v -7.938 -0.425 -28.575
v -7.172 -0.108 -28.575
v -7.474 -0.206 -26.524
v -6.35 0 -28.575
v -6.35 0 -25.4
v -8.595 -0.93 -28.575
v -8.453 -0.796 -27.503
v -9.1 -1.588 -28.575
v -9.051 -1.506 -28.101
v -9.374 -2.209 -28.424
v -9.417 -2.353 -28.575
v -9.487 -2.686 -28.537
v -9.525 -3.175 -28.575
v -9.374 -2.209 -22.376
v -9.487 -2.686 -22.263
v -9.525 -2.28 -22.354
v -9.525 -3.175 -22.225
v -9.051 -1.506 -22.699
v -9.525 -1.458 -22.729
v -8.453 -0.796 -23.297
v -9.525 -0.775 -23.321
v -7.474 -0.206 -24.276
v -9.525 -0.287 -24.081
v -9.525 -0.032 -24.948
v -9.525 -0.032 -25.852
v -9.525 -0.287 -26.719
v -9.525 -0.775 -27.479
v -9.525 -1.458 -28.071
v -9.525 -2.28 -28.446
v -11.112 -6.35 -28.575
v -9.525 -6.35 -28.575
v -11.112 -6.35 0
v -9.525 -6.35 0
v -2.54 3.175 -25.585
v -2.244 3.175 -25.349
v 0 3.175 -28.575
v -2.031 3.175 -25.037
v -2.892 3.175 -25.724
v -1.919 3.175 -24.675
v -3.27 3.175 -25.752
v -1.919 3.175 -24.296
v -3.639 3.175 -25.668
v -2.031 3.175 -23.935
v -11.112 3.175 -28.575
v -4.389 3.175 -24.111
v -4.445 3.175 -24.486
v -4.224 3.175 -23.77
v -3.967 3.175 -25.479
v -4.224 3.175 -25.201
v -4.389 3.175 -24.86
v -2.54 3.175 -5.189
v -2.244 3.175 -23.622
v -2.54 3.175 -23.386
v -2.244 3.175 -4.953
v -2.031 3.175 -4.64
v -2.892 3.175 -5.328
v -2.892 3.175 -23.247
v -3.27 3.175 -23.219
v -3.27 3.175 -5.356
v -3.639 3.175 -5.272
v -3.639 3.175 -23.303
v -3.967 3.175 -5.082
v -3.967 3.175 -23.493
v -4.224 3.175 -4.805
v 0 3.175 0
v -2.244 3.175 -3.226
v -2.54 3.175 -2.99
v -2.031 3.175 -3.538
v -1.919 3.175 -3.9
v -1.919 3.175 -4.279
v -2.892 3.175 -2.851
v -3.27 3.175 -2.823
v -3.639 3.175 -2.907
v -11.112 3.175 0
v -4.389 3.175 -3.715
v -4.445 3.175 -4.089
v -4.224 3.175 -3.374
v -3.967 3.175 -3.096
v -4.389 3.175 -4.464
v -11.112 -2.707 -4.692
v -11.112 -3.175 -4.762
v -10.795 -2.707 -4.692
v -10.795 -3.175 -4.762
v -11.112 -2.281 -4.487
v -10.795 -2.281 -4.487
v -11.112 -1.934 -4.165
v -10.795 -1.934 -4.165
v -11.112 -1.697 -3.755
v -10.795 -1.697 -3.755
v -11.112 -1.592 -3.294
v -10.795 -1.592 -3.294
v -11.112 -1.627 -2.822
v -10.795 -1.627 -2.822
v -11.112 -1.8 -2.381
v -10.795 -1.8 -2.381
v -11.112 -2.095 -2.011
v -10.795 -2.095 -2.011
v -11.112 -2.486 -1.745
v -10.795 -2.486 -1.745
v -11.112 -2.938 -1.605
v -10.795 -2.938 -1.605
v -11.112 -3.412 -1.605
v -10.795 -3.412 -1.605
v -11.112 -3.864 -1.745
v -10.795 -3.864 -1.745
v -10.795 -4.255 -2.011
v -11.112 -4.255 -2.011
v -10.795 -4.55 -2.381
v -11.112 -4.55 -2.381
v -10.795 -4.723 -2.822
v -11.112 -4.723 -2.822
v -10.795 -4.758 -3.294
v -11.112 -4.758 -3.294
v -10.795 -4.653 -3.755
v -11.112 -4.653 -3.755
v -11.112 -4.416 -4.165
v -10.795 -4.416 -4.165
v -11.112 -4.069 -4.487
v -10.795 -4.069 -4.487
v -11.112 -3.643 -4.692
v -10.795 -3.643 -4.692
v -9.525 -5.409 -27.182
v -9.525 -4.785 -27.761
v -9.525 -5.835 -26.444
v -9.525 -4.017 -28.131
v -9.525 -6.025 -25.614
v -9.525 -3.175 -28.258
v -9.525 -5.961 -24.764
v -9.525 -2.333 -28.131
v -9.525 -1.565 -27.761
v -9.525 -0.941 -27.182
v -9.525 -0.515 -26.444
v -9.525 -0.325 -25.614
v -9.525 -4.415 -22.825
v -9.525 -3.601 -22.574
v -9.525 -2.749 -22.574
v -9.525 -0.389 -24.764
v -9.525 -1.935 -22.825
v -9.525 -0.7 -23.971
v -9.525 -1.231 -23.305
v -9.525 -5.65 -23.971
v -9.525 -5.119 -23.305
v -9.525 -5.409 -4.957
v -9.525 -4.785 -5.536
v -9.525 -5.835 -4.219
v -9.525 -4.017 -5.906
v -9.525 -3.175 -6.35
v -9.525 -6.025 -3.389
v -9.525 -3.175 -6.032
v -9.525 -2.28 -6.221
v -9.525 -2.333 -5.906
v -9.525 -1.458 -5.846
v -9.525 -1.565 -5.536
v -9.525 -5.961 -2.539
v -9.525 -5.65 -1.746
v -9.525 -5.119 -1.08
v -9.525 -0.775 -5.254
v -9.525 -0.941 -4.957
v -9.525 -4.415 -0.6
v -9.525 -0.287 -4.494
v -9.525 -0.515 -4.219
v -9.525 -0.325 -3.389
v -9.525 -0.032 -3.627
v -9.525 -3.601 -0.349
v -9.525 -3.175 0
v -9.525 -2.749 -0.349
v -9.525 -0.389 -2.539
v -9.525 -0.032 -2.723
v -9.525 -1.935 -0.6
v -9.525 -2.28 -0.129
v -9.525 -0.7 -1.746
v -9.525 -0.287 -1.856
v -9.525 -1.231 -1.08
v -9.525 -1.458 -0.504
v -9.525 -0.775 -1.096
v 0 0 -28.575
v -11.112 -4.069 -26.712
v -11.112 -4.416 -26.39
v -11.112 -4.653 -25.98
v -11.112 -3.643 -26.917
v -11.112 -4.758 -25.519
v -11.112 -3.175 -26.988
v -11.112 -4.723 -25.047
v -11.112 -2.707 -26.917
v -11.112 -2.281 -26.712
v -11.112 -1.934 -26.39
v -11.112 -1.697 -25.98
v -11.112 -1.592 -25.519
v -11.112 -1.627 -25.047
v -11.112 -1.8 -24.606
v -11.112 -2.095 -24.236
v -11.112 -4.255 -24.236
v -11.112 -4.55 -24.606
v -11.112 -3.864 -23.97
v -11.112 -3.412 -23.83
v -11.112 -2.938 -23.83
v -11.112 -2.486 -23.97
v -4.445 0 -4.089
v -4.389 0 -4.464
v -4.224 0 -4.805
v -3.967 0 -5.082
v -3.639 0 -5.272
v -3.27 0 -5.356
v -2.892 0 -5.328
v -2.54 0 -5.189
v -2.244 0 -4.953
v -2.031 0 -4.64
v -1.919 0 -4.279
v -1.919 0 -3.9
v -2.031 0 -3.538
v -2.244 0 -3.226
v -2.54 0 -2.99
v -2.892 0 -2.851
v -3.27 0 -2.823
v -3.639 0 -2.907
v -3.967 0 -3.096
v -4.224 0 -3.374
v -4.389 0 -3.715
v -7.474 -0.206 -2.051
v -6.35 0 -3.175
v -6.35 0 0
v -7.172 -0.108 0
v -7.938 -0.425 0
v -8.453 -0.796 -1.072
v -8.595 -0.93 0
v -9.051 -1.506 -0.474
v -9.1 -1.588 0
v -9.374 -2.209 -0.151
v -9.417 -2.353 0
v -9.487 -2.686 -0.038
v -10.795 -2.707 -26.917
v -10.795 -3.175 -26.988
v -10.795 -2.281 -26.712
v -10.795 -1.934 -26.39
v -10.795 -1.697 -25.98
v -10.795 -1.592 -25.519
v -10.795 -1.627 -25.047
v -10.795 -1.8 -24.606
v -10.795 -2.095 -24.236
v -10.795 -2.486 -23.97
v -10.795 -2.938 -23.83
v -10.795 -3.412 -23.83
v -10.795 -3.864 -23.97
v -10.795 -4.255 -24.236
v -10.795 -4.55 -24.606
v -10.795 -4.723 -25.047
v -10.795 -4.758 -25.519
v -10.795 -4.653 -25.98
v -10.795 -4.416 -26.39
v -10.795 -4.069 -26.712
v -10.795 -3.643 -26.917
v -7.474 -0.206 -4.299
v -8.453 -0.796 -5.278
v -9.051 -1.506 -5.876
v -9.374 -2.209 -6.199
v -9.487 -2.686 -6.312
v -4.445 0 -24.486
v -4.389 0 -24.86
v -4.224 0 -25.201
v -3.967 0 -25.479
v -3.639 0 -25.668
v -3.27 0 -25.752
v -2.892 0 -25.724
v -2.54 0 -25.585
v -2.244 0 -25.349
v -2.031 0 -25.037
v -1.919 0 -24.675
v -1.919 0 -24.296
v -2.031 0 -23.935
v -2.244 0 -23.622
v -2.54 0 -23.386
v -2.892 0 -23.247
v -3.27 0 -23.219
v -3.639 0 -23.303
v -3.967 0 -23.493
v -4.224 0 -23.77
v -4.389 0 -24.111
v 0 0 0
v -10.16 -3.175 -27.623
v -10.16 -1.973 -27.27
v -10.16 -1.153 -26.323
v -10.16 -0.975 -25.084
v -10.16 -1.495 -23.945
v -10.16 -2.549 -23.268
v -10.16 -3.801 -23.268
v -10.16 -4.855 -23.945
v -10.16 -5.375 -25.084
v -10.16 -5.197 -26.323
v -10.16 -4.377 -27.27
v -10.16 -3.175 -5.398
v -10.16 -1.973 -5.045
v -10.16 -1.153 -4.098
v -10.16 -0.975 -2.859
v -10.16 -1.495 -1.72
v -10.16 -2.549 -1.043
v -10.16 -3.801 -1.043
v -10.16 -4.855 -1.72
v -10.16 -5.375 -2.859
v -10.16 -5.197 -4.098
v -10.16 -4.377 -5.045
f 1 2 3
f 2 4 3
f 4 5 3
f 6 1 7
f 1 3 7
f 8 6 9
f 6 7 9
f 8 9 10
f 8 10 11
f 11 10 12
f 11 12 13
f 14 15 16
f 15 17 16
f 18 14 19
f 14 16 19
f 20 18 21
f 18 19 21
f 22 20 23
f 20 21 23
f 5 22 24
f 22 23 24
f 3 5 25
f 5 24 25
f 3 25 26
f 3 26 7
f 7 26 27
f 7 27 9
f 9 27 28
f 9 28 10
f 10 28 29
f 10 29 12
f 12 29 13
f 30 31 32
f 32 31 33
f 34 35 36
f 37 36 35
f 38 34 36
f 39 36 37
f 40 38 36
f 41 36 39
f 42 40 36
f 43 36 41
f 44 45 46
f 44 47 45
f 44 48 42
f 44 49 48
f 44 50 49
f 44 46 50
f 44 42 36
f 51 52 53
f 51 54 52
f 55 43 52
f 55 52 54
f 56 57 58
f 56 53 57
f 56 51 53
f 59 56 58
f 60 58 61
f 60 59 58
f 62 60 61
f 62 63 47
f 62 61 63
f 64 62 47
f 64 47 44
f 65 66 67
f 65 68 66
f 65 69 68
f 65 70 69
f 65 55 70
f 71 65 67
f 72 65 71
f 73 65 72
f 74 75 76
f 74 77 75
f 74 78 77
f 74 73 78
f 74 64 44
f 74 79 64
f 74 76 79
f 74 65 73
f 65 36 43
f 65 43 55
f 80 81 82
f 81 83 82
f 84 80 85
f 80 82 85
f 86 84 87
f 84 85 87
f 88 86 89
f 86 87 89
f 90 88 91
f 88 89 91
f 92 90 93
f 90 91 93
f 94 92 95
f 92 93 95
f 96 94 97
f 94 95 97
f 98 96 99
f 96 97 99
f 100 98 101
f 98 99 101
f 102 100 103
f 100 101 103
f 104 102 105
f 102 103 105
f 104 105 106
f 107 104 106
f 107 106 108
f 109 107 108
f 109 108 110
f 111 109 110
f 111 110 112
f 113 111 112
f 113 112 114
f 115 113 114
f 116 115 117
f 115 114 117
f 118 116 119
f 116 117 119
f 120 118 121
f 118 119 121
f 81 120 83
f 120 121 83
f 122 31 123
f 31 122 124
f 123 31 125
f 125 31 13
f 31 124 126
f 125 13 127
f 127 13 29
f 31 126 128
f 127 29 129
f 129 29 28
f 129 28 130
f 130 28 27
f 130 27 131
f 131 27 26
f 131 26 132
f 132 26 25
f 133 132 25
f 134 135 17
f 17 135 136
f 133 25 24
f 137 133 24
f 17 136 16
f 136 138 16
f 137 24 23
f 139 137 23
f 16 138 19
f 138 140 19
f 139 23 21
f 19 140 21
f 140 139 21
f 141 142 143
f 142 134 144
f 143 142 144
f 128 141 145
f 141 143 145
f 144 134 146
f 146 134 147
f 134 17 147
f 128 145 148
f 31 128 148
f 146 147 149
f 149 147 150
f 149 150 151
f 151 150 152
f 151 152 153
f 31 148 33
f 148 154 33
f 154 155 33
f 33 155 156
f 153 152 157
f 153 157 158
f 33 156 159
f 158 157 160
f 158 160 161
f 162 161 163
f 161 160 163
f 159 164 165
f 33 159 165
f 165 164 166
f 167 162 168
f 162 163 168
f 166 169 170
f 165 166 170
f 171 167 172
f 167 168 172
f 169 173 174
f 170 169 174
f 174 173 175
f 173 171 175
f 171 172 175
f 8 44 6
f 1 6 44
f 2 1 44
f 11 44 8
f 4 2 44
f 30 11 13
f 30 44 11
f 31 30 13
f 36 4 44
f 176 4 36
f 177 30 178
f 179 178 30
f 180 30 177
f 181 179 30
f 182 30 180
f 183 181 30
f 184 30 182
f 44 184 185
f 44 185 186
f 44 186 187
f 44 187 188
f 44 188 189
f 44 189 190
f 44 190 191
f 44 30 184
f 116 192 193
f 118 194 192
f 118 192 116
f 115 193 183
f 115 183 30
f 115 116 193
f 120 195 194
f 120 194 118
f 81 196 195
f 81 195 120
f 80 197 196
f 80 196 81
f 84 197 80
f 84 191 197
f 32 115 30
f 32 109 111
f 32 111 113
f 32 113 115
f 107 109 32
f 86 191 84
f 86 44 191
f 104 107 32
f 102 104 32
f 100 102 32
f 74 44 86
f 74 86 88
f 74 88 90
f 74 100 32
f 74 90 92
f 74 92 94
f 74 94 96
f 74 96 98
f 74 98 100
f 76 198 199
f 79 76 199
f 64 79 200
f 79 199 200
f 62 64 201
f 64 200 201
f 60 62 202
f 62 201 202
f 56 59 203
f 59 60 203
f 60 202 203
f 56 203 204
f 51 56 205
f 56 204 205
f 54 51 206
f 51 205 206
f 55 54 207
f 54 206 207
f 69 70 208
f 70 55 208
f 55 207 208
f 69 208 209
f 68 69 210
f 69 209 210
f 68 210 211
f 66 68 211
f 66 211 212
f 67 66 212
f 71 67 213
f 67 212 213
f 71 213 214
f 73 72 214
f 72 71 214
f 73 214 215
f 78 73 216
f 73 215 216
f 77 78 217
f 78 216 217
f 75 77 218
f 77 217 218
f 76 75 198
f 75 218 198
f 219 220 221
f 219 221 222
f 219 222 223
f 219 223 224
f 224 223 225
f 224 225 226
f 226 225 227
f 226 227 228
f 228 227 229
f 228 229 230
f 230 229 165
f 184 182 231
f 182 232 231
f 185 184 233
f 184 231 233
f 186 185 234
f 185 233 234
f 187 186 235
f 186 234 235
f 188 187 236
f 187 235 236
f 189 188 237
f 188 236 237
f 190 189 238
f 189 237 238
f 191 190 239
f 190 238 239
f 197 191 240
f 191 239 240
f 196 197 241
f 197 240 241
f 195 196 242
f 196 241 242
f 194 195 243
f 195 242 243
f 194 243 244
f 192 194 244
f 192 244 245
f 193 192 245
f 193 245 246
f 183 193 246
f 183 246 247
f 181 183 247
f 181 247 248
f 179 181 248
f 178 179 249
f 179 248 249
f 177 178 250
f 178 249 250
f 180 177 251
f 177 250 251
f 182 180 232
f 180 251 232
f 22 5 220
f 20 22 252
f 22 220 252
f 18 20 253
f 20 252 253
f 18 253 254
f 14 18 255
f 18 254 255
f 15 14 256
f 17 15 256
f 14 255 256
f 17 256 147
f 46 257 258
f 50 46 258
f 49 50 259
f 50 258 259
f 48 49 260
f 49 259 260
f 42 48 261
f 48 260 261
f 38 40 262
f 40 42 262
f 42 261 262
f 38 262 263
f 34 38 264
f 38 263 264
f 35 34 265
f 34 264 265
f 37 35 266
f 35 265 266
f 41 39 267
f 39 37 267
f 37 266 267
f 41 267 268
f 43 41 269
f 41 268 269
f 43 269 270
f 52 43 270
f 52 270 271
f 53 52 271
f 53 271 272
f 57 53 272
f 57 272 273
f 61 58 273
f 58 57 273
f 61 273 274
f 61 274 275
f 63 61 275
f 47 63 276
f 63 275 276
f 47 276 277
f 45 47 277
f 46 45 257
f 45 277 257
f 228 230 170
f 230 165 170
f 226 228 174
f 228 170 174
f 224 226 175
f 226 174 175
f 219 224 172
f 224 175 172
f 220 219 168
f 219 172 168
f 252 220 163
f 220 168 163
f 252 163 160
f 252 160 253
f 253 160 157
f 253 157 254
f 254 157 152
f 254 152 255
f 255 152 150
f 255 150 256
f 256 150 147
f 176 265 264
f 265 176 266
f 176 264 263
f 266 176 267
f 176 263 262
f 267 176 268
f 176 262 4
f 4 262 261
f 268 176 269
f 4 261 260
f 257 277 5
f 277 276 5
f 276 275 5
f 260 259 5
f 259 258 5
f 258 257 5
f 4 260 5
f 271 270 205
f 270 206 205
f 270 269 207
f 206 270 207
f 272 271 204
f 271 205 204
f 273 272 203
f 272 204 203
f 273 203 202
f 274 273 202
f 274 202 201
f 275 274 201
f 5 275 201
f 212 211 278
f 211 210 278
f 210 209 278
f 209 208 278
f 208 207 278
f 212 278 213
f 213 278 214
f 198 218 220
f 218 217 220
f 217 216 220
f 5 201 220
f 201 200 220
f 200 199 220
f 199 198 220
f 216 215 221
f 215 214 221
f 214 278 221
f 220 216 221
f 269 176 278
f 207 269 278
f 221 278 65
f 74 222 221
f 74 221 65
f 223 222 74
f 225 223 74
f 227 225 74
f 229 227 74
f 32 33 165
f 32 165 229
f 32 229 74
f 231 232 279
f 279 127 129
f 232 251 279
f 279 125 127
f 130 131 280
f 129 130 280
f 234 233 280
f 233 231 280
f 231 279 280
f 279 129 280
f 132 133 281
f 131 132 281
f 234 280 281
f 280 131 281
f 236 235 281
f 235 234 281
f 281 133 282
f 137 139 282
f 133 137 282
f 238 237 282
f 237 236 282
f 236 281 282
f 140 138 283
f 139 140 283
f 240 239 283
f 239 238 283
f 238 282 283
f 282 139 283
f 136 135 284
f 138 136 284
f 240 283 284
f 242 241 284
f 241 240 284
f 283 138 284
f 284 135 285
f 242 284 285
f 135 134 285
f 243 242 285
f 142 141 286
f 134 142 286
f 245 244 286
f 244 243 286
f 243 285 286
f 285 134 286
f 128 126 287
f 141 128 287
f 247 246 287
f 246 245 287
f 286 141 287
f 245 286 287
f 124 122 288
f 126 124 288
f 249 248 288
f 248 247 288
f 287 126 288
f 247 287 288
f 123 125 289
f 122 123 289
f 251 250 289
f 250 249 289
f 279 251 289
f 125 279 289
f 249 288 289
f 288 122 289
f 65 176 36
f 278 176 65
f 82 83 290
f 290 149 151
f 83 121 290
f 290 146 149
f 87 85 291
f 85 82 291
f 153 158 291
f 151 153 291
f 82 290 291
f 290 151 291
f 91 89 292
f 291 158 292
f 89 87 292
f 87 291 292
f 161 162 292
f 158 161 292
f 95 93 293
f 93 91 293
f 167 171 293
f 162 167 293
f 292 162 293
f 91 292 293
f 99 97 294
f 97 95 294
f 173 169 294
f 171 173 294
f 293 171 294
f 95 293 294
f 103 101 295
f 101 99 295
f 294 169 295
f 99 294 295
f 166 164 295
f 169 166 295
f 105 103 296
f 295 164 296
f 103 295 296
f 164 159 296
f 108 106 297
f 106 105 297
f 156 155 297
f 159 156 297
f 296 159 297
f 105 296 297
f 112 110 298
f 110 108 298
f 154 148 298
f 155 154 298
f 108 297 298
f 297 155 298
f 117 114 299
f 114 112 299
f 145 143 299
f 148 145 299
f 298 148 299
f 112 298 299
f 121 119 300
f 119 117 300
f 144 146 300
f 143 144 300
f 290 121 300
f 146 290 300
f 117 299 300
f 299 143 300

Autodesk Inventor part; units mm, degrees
ref_plane "YZ Plane" through (0, 0, 0) normal (1, 0, 0) x (0, 1, 0)
ref_plane "XZ Plane" through (0, 0, 0) normal (0, 1, 0) x (-1, 0, 0)
ref_plane "XY Plane" through (0, 0, 0) normal (0, 0, 1) x (1, 0, 0)
sketch "Sketch1" plane through (0, 0, 0) normal (0, 1, 0) x (-1, 0, 0)
  line L0 (0, 0) -> (9.525, 0)
  line L1 (9.525, 0) -> (9.525, -28.575)
  line L2 (9.525, -28.575) -> (0, -28.575)
  line L3 (0, -28.575) -> (0, 0)
  circle A0 centre (3.175, -4.0894) radius 1.27
  circle A1 centre (3.175, -24.4856) radius 1.27
  dimension "d0" = 9.525
  dimension "d1" = 28.575
  dimension "d2" = 2.54
  dimension "d3" = 2.54
  dimension "d4" = 20.3962
  dimension "d5" = 4.0894
  dimension "d6" = 6.35
extrude "Extrusion1" add sketch "Sketch1" along normal blind 3.175
sketch "Sketch2" plane through (-9.525, 0, -28.575) normal (-1, 0, 0) x (0, 0, 1)
  line L0 (28.575, 0) -> (0, 0) projected
  line L1 (28.575, 0) -> (28.575, 3.175) projected
  line L2 (0, 3.175) -> (28.575, 3.175) projected
  line L3 (0, 0) -> (0, 3.175) projected
  line L4 (28.575, 3.175) -> (0, 3.175) projected
  line L5 (28.575, 3.175) -> (0, 3.175)
  line L6 (0, 3.175) -> (0, -6.35)
  line L7 (0, -6.35) -> (28.575, -6.35)
  line L8 (28.575, -6.35) -> (28.575, 3.175)
  point P0 (28.575, 0)
  dimension "d9" = 9.525
extrude "Extrusion2" add sketch "Sketch2" along normal blind 1.5875
sketch "Sketch3" plane through (-9.525, 0, -28.575) normal (1, 0, 0) x (0, 0, -1)
  line L0 (-28.575, 0) -> (0, 0) projected
  line L1 (-28.575, -6.35) -> (-28.575, 0) projected
  line L2 (0, -6.35) -> (-28.575, -6.35) projected
  line L3 (0, 0) -> (0, -6.35) projected
  circle A0 centre (-25.4, -3.175) radius 1.5875
  circle A1 centre (-3.175, -3.175) radius 1.5875
  point P0 (-28.575, 0)
  dimension "d12" = 3.175
  dimension "d13" = 3.175
  dimension "d14" = 3.175
  dimension "d15" = 3.175
extrude "Extrusion3" cut sketch "Sketch3" against normal blind 1.5875 contours A0 | A1
fillet "Fillet1" radius 3.175 1 edges at (-9.525, 0, -14.2875)
sketch "Sketch4" plane through (-9.525, 0, -28.575) normal (1, 0, 0) x (0, 0, -1)
  arc A0 (-4.7625, -3.175) -> (-1.5875, -3.175) centre (-3.175, -3.175) ccw projected
  arc A1 (-26.9875, -3.175) -> (-23.8125, -3.175) centre (-25.4, -3.175) ccw projected
  circle A2 centre (-25.4, -3.175) radius 3.175
  circle A3 centre (-3.175, -3.175) radius 3.175
  point P0 (-28.575, 0)
  dimension "d22" = 6.35
  dimension "d23" = 6.35
extrude "Extrusion4" cut sketch "Sketch4" along normal blind 25.4
chamfer "Chamfer2" distance 1.27 angle 45 2 edges at (-9.525, -3.175, -1.5875) (-9.525, -3.175, -23.8125)
equation "\"d3\" = d2"
equation "\"d23\" = d22"
properties part number "limitSwitchHolderMount" material "ABS Plastic"
